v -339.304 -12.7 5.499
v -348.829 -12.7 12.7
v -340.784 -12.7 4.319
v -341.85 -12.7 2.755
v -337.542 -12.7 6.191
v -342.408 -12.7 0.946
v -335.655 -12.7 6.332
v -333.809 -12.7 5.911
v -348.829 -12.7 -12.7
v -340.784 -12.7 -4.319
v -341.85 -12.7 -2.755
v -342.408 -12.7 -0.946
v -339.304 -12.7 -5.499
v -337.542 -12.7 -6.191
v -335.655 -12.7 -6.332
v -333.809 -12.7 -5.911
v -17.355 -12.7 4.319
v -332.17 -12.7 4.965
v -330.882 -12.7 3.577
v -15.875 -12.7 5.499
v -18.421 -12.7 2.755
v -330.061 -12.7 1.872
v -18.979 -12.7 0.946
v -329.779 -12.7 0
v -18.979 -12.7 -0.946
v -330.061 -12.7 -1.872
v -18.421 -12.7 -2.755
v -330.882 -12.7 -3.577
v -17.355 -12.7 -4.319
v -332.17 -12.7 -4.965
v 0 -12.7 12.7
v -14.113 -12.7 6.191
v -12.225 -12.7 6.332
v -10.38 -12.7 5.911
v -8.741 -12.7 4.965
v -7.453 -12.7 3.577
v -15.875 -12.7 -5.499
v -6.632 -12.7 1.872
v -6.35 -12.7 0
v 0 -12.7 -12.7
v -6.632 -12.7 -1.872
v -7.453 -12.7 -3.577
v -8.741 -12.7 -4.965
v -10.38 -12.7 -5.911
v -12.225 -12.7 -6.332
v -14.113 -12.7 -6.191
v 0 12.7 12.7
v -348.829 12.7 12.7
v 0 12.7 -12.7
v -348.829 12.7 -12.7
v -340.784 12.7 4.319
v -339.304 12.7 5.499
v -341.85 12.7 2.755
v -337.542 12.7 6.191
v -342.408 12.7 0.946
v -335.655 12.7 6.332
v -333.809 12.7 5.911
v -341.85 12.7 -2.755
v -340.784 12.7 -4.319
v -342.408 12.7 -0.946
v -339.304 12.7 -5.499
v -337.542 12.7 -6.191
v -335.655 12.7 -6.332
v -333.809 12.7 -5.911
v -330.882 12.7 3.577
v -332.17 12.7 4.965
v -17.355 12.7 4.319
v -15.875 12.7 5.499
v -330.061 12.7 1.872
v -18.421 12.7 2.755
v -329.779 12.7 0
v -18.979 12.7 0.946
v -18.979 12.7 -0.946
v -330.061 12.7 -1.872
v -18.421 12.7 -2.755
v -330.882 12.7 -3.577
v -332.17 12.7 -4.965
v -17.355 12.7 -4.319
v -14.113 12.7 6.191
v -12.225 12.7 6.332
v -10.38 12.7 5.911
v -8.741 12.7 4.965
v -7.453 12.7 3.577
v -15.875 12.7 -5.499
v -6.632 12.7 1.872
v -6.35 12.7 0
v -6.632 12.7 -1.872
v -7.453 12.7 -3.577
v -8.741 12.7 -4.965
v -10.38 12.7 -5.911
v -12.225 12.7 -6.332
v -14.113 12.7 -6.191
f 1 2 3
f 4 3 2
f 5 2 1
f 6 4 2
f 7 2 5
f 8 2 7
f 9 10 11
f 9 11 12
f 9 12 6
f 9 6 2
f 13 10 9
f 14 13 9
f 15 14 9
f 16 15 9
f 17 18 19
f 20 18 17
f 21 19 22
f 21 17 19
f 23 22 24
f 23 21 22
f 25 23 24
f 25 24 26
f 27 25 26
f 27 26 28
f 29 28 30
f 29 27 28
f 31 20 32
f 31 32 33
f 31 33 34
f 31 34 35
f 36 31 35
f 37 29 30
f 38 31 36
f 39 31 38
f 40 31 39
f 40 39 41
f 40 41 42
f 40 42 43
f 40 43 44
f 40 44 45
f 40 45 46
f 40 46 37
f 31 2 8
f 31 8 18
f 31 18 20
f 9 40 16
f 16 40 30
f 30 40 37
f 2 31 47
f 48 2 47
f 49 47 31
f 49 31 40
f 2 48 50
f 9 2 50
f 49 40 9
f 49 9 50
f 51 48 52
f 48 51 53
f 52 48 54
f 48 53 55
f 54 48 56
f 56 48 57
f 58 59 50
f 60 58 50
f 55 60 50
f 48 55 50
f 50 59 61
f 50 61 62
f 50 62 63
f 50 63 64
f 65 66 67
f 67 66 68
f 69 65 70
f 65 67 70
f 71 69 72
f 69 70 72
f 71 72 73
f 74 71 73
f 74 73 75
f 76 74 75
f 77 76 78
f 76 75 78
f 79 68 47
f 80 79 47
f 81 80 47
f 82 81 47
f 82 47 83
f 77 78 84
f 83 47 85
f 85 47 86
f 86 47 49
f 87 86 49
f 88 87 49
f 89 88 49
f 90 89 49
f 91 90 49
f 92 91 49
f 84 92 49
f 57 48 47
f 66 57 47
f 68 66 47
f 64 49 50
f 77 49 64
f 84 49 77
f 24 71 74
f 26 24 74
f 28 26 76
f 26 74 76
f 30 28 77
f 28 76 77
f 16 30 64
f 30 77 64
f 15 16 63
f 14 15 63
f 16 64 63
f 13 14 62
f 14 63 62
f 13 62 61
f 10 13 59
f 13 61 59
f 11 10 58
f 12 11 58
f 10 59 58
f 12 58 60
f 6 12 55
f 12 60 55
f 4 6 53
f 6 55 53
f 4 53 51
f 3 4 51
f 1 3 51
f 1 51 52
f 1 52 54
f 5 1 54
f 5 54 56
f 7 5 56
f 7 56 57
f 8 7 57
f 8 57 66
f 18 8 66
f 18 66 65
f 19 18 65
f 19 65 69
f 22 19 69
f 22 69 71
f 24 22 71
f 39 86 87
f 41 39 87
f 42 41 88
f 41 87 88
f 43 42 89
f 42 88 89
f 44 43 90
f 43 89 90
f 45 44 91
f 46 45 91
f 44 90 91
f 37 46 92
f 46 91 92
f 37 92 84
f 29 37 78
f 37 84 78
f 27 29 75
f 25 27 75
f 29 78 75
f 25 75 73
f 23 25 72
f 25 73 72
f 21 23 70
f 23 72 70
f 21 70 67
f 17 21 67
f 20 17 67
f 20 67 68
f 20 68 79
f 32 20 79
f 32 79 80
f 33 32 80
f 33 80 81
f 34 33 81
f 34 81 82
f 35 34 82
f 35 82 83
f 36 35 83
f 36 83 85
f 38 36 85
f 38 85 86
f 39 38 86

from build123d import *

# Parameters (mm, degrees)
SKETCH1_W           = 25.4
SKETCH1_H           = 25.4
BOSS_EXTRUDE1_DEPTH = 348.829051578
SKETCH2_R           = 6.35
CUT_EXTRUDE1_DEPTH  = 26.4


with BuildPart() as part:
    # Sketch1 → Boss-Extrude1 (new body)
    with BuildSketch(Plane(origin=(0, 0, 0), x_dir=(0, 0, -1), z_dir=(1, 0, 0))):
        Rectangle(SKETCH1_W, SKETCH1_H)
    extrude(amount=-BOSS_EXTRUDE1_DEPTH)

    # Sketch2 → Cut-Extrude1 (cut, through all)
    with BuildSketch(Plane(origin=(0, 12.7, 0), x_dir=(1, 0, 0), z_dir=(0, 1, 0))):
        with Locations((-336.129051578, 0)):
            Circle(SKETCH2_R)
        with Locations((-12.7, 0)):
            Circle(SKETCH2_R)
    extrude(amount=-CUT_EXTRUDE1_DEPTH, mode=Mode.SUBTRACT)


solid = part.part
